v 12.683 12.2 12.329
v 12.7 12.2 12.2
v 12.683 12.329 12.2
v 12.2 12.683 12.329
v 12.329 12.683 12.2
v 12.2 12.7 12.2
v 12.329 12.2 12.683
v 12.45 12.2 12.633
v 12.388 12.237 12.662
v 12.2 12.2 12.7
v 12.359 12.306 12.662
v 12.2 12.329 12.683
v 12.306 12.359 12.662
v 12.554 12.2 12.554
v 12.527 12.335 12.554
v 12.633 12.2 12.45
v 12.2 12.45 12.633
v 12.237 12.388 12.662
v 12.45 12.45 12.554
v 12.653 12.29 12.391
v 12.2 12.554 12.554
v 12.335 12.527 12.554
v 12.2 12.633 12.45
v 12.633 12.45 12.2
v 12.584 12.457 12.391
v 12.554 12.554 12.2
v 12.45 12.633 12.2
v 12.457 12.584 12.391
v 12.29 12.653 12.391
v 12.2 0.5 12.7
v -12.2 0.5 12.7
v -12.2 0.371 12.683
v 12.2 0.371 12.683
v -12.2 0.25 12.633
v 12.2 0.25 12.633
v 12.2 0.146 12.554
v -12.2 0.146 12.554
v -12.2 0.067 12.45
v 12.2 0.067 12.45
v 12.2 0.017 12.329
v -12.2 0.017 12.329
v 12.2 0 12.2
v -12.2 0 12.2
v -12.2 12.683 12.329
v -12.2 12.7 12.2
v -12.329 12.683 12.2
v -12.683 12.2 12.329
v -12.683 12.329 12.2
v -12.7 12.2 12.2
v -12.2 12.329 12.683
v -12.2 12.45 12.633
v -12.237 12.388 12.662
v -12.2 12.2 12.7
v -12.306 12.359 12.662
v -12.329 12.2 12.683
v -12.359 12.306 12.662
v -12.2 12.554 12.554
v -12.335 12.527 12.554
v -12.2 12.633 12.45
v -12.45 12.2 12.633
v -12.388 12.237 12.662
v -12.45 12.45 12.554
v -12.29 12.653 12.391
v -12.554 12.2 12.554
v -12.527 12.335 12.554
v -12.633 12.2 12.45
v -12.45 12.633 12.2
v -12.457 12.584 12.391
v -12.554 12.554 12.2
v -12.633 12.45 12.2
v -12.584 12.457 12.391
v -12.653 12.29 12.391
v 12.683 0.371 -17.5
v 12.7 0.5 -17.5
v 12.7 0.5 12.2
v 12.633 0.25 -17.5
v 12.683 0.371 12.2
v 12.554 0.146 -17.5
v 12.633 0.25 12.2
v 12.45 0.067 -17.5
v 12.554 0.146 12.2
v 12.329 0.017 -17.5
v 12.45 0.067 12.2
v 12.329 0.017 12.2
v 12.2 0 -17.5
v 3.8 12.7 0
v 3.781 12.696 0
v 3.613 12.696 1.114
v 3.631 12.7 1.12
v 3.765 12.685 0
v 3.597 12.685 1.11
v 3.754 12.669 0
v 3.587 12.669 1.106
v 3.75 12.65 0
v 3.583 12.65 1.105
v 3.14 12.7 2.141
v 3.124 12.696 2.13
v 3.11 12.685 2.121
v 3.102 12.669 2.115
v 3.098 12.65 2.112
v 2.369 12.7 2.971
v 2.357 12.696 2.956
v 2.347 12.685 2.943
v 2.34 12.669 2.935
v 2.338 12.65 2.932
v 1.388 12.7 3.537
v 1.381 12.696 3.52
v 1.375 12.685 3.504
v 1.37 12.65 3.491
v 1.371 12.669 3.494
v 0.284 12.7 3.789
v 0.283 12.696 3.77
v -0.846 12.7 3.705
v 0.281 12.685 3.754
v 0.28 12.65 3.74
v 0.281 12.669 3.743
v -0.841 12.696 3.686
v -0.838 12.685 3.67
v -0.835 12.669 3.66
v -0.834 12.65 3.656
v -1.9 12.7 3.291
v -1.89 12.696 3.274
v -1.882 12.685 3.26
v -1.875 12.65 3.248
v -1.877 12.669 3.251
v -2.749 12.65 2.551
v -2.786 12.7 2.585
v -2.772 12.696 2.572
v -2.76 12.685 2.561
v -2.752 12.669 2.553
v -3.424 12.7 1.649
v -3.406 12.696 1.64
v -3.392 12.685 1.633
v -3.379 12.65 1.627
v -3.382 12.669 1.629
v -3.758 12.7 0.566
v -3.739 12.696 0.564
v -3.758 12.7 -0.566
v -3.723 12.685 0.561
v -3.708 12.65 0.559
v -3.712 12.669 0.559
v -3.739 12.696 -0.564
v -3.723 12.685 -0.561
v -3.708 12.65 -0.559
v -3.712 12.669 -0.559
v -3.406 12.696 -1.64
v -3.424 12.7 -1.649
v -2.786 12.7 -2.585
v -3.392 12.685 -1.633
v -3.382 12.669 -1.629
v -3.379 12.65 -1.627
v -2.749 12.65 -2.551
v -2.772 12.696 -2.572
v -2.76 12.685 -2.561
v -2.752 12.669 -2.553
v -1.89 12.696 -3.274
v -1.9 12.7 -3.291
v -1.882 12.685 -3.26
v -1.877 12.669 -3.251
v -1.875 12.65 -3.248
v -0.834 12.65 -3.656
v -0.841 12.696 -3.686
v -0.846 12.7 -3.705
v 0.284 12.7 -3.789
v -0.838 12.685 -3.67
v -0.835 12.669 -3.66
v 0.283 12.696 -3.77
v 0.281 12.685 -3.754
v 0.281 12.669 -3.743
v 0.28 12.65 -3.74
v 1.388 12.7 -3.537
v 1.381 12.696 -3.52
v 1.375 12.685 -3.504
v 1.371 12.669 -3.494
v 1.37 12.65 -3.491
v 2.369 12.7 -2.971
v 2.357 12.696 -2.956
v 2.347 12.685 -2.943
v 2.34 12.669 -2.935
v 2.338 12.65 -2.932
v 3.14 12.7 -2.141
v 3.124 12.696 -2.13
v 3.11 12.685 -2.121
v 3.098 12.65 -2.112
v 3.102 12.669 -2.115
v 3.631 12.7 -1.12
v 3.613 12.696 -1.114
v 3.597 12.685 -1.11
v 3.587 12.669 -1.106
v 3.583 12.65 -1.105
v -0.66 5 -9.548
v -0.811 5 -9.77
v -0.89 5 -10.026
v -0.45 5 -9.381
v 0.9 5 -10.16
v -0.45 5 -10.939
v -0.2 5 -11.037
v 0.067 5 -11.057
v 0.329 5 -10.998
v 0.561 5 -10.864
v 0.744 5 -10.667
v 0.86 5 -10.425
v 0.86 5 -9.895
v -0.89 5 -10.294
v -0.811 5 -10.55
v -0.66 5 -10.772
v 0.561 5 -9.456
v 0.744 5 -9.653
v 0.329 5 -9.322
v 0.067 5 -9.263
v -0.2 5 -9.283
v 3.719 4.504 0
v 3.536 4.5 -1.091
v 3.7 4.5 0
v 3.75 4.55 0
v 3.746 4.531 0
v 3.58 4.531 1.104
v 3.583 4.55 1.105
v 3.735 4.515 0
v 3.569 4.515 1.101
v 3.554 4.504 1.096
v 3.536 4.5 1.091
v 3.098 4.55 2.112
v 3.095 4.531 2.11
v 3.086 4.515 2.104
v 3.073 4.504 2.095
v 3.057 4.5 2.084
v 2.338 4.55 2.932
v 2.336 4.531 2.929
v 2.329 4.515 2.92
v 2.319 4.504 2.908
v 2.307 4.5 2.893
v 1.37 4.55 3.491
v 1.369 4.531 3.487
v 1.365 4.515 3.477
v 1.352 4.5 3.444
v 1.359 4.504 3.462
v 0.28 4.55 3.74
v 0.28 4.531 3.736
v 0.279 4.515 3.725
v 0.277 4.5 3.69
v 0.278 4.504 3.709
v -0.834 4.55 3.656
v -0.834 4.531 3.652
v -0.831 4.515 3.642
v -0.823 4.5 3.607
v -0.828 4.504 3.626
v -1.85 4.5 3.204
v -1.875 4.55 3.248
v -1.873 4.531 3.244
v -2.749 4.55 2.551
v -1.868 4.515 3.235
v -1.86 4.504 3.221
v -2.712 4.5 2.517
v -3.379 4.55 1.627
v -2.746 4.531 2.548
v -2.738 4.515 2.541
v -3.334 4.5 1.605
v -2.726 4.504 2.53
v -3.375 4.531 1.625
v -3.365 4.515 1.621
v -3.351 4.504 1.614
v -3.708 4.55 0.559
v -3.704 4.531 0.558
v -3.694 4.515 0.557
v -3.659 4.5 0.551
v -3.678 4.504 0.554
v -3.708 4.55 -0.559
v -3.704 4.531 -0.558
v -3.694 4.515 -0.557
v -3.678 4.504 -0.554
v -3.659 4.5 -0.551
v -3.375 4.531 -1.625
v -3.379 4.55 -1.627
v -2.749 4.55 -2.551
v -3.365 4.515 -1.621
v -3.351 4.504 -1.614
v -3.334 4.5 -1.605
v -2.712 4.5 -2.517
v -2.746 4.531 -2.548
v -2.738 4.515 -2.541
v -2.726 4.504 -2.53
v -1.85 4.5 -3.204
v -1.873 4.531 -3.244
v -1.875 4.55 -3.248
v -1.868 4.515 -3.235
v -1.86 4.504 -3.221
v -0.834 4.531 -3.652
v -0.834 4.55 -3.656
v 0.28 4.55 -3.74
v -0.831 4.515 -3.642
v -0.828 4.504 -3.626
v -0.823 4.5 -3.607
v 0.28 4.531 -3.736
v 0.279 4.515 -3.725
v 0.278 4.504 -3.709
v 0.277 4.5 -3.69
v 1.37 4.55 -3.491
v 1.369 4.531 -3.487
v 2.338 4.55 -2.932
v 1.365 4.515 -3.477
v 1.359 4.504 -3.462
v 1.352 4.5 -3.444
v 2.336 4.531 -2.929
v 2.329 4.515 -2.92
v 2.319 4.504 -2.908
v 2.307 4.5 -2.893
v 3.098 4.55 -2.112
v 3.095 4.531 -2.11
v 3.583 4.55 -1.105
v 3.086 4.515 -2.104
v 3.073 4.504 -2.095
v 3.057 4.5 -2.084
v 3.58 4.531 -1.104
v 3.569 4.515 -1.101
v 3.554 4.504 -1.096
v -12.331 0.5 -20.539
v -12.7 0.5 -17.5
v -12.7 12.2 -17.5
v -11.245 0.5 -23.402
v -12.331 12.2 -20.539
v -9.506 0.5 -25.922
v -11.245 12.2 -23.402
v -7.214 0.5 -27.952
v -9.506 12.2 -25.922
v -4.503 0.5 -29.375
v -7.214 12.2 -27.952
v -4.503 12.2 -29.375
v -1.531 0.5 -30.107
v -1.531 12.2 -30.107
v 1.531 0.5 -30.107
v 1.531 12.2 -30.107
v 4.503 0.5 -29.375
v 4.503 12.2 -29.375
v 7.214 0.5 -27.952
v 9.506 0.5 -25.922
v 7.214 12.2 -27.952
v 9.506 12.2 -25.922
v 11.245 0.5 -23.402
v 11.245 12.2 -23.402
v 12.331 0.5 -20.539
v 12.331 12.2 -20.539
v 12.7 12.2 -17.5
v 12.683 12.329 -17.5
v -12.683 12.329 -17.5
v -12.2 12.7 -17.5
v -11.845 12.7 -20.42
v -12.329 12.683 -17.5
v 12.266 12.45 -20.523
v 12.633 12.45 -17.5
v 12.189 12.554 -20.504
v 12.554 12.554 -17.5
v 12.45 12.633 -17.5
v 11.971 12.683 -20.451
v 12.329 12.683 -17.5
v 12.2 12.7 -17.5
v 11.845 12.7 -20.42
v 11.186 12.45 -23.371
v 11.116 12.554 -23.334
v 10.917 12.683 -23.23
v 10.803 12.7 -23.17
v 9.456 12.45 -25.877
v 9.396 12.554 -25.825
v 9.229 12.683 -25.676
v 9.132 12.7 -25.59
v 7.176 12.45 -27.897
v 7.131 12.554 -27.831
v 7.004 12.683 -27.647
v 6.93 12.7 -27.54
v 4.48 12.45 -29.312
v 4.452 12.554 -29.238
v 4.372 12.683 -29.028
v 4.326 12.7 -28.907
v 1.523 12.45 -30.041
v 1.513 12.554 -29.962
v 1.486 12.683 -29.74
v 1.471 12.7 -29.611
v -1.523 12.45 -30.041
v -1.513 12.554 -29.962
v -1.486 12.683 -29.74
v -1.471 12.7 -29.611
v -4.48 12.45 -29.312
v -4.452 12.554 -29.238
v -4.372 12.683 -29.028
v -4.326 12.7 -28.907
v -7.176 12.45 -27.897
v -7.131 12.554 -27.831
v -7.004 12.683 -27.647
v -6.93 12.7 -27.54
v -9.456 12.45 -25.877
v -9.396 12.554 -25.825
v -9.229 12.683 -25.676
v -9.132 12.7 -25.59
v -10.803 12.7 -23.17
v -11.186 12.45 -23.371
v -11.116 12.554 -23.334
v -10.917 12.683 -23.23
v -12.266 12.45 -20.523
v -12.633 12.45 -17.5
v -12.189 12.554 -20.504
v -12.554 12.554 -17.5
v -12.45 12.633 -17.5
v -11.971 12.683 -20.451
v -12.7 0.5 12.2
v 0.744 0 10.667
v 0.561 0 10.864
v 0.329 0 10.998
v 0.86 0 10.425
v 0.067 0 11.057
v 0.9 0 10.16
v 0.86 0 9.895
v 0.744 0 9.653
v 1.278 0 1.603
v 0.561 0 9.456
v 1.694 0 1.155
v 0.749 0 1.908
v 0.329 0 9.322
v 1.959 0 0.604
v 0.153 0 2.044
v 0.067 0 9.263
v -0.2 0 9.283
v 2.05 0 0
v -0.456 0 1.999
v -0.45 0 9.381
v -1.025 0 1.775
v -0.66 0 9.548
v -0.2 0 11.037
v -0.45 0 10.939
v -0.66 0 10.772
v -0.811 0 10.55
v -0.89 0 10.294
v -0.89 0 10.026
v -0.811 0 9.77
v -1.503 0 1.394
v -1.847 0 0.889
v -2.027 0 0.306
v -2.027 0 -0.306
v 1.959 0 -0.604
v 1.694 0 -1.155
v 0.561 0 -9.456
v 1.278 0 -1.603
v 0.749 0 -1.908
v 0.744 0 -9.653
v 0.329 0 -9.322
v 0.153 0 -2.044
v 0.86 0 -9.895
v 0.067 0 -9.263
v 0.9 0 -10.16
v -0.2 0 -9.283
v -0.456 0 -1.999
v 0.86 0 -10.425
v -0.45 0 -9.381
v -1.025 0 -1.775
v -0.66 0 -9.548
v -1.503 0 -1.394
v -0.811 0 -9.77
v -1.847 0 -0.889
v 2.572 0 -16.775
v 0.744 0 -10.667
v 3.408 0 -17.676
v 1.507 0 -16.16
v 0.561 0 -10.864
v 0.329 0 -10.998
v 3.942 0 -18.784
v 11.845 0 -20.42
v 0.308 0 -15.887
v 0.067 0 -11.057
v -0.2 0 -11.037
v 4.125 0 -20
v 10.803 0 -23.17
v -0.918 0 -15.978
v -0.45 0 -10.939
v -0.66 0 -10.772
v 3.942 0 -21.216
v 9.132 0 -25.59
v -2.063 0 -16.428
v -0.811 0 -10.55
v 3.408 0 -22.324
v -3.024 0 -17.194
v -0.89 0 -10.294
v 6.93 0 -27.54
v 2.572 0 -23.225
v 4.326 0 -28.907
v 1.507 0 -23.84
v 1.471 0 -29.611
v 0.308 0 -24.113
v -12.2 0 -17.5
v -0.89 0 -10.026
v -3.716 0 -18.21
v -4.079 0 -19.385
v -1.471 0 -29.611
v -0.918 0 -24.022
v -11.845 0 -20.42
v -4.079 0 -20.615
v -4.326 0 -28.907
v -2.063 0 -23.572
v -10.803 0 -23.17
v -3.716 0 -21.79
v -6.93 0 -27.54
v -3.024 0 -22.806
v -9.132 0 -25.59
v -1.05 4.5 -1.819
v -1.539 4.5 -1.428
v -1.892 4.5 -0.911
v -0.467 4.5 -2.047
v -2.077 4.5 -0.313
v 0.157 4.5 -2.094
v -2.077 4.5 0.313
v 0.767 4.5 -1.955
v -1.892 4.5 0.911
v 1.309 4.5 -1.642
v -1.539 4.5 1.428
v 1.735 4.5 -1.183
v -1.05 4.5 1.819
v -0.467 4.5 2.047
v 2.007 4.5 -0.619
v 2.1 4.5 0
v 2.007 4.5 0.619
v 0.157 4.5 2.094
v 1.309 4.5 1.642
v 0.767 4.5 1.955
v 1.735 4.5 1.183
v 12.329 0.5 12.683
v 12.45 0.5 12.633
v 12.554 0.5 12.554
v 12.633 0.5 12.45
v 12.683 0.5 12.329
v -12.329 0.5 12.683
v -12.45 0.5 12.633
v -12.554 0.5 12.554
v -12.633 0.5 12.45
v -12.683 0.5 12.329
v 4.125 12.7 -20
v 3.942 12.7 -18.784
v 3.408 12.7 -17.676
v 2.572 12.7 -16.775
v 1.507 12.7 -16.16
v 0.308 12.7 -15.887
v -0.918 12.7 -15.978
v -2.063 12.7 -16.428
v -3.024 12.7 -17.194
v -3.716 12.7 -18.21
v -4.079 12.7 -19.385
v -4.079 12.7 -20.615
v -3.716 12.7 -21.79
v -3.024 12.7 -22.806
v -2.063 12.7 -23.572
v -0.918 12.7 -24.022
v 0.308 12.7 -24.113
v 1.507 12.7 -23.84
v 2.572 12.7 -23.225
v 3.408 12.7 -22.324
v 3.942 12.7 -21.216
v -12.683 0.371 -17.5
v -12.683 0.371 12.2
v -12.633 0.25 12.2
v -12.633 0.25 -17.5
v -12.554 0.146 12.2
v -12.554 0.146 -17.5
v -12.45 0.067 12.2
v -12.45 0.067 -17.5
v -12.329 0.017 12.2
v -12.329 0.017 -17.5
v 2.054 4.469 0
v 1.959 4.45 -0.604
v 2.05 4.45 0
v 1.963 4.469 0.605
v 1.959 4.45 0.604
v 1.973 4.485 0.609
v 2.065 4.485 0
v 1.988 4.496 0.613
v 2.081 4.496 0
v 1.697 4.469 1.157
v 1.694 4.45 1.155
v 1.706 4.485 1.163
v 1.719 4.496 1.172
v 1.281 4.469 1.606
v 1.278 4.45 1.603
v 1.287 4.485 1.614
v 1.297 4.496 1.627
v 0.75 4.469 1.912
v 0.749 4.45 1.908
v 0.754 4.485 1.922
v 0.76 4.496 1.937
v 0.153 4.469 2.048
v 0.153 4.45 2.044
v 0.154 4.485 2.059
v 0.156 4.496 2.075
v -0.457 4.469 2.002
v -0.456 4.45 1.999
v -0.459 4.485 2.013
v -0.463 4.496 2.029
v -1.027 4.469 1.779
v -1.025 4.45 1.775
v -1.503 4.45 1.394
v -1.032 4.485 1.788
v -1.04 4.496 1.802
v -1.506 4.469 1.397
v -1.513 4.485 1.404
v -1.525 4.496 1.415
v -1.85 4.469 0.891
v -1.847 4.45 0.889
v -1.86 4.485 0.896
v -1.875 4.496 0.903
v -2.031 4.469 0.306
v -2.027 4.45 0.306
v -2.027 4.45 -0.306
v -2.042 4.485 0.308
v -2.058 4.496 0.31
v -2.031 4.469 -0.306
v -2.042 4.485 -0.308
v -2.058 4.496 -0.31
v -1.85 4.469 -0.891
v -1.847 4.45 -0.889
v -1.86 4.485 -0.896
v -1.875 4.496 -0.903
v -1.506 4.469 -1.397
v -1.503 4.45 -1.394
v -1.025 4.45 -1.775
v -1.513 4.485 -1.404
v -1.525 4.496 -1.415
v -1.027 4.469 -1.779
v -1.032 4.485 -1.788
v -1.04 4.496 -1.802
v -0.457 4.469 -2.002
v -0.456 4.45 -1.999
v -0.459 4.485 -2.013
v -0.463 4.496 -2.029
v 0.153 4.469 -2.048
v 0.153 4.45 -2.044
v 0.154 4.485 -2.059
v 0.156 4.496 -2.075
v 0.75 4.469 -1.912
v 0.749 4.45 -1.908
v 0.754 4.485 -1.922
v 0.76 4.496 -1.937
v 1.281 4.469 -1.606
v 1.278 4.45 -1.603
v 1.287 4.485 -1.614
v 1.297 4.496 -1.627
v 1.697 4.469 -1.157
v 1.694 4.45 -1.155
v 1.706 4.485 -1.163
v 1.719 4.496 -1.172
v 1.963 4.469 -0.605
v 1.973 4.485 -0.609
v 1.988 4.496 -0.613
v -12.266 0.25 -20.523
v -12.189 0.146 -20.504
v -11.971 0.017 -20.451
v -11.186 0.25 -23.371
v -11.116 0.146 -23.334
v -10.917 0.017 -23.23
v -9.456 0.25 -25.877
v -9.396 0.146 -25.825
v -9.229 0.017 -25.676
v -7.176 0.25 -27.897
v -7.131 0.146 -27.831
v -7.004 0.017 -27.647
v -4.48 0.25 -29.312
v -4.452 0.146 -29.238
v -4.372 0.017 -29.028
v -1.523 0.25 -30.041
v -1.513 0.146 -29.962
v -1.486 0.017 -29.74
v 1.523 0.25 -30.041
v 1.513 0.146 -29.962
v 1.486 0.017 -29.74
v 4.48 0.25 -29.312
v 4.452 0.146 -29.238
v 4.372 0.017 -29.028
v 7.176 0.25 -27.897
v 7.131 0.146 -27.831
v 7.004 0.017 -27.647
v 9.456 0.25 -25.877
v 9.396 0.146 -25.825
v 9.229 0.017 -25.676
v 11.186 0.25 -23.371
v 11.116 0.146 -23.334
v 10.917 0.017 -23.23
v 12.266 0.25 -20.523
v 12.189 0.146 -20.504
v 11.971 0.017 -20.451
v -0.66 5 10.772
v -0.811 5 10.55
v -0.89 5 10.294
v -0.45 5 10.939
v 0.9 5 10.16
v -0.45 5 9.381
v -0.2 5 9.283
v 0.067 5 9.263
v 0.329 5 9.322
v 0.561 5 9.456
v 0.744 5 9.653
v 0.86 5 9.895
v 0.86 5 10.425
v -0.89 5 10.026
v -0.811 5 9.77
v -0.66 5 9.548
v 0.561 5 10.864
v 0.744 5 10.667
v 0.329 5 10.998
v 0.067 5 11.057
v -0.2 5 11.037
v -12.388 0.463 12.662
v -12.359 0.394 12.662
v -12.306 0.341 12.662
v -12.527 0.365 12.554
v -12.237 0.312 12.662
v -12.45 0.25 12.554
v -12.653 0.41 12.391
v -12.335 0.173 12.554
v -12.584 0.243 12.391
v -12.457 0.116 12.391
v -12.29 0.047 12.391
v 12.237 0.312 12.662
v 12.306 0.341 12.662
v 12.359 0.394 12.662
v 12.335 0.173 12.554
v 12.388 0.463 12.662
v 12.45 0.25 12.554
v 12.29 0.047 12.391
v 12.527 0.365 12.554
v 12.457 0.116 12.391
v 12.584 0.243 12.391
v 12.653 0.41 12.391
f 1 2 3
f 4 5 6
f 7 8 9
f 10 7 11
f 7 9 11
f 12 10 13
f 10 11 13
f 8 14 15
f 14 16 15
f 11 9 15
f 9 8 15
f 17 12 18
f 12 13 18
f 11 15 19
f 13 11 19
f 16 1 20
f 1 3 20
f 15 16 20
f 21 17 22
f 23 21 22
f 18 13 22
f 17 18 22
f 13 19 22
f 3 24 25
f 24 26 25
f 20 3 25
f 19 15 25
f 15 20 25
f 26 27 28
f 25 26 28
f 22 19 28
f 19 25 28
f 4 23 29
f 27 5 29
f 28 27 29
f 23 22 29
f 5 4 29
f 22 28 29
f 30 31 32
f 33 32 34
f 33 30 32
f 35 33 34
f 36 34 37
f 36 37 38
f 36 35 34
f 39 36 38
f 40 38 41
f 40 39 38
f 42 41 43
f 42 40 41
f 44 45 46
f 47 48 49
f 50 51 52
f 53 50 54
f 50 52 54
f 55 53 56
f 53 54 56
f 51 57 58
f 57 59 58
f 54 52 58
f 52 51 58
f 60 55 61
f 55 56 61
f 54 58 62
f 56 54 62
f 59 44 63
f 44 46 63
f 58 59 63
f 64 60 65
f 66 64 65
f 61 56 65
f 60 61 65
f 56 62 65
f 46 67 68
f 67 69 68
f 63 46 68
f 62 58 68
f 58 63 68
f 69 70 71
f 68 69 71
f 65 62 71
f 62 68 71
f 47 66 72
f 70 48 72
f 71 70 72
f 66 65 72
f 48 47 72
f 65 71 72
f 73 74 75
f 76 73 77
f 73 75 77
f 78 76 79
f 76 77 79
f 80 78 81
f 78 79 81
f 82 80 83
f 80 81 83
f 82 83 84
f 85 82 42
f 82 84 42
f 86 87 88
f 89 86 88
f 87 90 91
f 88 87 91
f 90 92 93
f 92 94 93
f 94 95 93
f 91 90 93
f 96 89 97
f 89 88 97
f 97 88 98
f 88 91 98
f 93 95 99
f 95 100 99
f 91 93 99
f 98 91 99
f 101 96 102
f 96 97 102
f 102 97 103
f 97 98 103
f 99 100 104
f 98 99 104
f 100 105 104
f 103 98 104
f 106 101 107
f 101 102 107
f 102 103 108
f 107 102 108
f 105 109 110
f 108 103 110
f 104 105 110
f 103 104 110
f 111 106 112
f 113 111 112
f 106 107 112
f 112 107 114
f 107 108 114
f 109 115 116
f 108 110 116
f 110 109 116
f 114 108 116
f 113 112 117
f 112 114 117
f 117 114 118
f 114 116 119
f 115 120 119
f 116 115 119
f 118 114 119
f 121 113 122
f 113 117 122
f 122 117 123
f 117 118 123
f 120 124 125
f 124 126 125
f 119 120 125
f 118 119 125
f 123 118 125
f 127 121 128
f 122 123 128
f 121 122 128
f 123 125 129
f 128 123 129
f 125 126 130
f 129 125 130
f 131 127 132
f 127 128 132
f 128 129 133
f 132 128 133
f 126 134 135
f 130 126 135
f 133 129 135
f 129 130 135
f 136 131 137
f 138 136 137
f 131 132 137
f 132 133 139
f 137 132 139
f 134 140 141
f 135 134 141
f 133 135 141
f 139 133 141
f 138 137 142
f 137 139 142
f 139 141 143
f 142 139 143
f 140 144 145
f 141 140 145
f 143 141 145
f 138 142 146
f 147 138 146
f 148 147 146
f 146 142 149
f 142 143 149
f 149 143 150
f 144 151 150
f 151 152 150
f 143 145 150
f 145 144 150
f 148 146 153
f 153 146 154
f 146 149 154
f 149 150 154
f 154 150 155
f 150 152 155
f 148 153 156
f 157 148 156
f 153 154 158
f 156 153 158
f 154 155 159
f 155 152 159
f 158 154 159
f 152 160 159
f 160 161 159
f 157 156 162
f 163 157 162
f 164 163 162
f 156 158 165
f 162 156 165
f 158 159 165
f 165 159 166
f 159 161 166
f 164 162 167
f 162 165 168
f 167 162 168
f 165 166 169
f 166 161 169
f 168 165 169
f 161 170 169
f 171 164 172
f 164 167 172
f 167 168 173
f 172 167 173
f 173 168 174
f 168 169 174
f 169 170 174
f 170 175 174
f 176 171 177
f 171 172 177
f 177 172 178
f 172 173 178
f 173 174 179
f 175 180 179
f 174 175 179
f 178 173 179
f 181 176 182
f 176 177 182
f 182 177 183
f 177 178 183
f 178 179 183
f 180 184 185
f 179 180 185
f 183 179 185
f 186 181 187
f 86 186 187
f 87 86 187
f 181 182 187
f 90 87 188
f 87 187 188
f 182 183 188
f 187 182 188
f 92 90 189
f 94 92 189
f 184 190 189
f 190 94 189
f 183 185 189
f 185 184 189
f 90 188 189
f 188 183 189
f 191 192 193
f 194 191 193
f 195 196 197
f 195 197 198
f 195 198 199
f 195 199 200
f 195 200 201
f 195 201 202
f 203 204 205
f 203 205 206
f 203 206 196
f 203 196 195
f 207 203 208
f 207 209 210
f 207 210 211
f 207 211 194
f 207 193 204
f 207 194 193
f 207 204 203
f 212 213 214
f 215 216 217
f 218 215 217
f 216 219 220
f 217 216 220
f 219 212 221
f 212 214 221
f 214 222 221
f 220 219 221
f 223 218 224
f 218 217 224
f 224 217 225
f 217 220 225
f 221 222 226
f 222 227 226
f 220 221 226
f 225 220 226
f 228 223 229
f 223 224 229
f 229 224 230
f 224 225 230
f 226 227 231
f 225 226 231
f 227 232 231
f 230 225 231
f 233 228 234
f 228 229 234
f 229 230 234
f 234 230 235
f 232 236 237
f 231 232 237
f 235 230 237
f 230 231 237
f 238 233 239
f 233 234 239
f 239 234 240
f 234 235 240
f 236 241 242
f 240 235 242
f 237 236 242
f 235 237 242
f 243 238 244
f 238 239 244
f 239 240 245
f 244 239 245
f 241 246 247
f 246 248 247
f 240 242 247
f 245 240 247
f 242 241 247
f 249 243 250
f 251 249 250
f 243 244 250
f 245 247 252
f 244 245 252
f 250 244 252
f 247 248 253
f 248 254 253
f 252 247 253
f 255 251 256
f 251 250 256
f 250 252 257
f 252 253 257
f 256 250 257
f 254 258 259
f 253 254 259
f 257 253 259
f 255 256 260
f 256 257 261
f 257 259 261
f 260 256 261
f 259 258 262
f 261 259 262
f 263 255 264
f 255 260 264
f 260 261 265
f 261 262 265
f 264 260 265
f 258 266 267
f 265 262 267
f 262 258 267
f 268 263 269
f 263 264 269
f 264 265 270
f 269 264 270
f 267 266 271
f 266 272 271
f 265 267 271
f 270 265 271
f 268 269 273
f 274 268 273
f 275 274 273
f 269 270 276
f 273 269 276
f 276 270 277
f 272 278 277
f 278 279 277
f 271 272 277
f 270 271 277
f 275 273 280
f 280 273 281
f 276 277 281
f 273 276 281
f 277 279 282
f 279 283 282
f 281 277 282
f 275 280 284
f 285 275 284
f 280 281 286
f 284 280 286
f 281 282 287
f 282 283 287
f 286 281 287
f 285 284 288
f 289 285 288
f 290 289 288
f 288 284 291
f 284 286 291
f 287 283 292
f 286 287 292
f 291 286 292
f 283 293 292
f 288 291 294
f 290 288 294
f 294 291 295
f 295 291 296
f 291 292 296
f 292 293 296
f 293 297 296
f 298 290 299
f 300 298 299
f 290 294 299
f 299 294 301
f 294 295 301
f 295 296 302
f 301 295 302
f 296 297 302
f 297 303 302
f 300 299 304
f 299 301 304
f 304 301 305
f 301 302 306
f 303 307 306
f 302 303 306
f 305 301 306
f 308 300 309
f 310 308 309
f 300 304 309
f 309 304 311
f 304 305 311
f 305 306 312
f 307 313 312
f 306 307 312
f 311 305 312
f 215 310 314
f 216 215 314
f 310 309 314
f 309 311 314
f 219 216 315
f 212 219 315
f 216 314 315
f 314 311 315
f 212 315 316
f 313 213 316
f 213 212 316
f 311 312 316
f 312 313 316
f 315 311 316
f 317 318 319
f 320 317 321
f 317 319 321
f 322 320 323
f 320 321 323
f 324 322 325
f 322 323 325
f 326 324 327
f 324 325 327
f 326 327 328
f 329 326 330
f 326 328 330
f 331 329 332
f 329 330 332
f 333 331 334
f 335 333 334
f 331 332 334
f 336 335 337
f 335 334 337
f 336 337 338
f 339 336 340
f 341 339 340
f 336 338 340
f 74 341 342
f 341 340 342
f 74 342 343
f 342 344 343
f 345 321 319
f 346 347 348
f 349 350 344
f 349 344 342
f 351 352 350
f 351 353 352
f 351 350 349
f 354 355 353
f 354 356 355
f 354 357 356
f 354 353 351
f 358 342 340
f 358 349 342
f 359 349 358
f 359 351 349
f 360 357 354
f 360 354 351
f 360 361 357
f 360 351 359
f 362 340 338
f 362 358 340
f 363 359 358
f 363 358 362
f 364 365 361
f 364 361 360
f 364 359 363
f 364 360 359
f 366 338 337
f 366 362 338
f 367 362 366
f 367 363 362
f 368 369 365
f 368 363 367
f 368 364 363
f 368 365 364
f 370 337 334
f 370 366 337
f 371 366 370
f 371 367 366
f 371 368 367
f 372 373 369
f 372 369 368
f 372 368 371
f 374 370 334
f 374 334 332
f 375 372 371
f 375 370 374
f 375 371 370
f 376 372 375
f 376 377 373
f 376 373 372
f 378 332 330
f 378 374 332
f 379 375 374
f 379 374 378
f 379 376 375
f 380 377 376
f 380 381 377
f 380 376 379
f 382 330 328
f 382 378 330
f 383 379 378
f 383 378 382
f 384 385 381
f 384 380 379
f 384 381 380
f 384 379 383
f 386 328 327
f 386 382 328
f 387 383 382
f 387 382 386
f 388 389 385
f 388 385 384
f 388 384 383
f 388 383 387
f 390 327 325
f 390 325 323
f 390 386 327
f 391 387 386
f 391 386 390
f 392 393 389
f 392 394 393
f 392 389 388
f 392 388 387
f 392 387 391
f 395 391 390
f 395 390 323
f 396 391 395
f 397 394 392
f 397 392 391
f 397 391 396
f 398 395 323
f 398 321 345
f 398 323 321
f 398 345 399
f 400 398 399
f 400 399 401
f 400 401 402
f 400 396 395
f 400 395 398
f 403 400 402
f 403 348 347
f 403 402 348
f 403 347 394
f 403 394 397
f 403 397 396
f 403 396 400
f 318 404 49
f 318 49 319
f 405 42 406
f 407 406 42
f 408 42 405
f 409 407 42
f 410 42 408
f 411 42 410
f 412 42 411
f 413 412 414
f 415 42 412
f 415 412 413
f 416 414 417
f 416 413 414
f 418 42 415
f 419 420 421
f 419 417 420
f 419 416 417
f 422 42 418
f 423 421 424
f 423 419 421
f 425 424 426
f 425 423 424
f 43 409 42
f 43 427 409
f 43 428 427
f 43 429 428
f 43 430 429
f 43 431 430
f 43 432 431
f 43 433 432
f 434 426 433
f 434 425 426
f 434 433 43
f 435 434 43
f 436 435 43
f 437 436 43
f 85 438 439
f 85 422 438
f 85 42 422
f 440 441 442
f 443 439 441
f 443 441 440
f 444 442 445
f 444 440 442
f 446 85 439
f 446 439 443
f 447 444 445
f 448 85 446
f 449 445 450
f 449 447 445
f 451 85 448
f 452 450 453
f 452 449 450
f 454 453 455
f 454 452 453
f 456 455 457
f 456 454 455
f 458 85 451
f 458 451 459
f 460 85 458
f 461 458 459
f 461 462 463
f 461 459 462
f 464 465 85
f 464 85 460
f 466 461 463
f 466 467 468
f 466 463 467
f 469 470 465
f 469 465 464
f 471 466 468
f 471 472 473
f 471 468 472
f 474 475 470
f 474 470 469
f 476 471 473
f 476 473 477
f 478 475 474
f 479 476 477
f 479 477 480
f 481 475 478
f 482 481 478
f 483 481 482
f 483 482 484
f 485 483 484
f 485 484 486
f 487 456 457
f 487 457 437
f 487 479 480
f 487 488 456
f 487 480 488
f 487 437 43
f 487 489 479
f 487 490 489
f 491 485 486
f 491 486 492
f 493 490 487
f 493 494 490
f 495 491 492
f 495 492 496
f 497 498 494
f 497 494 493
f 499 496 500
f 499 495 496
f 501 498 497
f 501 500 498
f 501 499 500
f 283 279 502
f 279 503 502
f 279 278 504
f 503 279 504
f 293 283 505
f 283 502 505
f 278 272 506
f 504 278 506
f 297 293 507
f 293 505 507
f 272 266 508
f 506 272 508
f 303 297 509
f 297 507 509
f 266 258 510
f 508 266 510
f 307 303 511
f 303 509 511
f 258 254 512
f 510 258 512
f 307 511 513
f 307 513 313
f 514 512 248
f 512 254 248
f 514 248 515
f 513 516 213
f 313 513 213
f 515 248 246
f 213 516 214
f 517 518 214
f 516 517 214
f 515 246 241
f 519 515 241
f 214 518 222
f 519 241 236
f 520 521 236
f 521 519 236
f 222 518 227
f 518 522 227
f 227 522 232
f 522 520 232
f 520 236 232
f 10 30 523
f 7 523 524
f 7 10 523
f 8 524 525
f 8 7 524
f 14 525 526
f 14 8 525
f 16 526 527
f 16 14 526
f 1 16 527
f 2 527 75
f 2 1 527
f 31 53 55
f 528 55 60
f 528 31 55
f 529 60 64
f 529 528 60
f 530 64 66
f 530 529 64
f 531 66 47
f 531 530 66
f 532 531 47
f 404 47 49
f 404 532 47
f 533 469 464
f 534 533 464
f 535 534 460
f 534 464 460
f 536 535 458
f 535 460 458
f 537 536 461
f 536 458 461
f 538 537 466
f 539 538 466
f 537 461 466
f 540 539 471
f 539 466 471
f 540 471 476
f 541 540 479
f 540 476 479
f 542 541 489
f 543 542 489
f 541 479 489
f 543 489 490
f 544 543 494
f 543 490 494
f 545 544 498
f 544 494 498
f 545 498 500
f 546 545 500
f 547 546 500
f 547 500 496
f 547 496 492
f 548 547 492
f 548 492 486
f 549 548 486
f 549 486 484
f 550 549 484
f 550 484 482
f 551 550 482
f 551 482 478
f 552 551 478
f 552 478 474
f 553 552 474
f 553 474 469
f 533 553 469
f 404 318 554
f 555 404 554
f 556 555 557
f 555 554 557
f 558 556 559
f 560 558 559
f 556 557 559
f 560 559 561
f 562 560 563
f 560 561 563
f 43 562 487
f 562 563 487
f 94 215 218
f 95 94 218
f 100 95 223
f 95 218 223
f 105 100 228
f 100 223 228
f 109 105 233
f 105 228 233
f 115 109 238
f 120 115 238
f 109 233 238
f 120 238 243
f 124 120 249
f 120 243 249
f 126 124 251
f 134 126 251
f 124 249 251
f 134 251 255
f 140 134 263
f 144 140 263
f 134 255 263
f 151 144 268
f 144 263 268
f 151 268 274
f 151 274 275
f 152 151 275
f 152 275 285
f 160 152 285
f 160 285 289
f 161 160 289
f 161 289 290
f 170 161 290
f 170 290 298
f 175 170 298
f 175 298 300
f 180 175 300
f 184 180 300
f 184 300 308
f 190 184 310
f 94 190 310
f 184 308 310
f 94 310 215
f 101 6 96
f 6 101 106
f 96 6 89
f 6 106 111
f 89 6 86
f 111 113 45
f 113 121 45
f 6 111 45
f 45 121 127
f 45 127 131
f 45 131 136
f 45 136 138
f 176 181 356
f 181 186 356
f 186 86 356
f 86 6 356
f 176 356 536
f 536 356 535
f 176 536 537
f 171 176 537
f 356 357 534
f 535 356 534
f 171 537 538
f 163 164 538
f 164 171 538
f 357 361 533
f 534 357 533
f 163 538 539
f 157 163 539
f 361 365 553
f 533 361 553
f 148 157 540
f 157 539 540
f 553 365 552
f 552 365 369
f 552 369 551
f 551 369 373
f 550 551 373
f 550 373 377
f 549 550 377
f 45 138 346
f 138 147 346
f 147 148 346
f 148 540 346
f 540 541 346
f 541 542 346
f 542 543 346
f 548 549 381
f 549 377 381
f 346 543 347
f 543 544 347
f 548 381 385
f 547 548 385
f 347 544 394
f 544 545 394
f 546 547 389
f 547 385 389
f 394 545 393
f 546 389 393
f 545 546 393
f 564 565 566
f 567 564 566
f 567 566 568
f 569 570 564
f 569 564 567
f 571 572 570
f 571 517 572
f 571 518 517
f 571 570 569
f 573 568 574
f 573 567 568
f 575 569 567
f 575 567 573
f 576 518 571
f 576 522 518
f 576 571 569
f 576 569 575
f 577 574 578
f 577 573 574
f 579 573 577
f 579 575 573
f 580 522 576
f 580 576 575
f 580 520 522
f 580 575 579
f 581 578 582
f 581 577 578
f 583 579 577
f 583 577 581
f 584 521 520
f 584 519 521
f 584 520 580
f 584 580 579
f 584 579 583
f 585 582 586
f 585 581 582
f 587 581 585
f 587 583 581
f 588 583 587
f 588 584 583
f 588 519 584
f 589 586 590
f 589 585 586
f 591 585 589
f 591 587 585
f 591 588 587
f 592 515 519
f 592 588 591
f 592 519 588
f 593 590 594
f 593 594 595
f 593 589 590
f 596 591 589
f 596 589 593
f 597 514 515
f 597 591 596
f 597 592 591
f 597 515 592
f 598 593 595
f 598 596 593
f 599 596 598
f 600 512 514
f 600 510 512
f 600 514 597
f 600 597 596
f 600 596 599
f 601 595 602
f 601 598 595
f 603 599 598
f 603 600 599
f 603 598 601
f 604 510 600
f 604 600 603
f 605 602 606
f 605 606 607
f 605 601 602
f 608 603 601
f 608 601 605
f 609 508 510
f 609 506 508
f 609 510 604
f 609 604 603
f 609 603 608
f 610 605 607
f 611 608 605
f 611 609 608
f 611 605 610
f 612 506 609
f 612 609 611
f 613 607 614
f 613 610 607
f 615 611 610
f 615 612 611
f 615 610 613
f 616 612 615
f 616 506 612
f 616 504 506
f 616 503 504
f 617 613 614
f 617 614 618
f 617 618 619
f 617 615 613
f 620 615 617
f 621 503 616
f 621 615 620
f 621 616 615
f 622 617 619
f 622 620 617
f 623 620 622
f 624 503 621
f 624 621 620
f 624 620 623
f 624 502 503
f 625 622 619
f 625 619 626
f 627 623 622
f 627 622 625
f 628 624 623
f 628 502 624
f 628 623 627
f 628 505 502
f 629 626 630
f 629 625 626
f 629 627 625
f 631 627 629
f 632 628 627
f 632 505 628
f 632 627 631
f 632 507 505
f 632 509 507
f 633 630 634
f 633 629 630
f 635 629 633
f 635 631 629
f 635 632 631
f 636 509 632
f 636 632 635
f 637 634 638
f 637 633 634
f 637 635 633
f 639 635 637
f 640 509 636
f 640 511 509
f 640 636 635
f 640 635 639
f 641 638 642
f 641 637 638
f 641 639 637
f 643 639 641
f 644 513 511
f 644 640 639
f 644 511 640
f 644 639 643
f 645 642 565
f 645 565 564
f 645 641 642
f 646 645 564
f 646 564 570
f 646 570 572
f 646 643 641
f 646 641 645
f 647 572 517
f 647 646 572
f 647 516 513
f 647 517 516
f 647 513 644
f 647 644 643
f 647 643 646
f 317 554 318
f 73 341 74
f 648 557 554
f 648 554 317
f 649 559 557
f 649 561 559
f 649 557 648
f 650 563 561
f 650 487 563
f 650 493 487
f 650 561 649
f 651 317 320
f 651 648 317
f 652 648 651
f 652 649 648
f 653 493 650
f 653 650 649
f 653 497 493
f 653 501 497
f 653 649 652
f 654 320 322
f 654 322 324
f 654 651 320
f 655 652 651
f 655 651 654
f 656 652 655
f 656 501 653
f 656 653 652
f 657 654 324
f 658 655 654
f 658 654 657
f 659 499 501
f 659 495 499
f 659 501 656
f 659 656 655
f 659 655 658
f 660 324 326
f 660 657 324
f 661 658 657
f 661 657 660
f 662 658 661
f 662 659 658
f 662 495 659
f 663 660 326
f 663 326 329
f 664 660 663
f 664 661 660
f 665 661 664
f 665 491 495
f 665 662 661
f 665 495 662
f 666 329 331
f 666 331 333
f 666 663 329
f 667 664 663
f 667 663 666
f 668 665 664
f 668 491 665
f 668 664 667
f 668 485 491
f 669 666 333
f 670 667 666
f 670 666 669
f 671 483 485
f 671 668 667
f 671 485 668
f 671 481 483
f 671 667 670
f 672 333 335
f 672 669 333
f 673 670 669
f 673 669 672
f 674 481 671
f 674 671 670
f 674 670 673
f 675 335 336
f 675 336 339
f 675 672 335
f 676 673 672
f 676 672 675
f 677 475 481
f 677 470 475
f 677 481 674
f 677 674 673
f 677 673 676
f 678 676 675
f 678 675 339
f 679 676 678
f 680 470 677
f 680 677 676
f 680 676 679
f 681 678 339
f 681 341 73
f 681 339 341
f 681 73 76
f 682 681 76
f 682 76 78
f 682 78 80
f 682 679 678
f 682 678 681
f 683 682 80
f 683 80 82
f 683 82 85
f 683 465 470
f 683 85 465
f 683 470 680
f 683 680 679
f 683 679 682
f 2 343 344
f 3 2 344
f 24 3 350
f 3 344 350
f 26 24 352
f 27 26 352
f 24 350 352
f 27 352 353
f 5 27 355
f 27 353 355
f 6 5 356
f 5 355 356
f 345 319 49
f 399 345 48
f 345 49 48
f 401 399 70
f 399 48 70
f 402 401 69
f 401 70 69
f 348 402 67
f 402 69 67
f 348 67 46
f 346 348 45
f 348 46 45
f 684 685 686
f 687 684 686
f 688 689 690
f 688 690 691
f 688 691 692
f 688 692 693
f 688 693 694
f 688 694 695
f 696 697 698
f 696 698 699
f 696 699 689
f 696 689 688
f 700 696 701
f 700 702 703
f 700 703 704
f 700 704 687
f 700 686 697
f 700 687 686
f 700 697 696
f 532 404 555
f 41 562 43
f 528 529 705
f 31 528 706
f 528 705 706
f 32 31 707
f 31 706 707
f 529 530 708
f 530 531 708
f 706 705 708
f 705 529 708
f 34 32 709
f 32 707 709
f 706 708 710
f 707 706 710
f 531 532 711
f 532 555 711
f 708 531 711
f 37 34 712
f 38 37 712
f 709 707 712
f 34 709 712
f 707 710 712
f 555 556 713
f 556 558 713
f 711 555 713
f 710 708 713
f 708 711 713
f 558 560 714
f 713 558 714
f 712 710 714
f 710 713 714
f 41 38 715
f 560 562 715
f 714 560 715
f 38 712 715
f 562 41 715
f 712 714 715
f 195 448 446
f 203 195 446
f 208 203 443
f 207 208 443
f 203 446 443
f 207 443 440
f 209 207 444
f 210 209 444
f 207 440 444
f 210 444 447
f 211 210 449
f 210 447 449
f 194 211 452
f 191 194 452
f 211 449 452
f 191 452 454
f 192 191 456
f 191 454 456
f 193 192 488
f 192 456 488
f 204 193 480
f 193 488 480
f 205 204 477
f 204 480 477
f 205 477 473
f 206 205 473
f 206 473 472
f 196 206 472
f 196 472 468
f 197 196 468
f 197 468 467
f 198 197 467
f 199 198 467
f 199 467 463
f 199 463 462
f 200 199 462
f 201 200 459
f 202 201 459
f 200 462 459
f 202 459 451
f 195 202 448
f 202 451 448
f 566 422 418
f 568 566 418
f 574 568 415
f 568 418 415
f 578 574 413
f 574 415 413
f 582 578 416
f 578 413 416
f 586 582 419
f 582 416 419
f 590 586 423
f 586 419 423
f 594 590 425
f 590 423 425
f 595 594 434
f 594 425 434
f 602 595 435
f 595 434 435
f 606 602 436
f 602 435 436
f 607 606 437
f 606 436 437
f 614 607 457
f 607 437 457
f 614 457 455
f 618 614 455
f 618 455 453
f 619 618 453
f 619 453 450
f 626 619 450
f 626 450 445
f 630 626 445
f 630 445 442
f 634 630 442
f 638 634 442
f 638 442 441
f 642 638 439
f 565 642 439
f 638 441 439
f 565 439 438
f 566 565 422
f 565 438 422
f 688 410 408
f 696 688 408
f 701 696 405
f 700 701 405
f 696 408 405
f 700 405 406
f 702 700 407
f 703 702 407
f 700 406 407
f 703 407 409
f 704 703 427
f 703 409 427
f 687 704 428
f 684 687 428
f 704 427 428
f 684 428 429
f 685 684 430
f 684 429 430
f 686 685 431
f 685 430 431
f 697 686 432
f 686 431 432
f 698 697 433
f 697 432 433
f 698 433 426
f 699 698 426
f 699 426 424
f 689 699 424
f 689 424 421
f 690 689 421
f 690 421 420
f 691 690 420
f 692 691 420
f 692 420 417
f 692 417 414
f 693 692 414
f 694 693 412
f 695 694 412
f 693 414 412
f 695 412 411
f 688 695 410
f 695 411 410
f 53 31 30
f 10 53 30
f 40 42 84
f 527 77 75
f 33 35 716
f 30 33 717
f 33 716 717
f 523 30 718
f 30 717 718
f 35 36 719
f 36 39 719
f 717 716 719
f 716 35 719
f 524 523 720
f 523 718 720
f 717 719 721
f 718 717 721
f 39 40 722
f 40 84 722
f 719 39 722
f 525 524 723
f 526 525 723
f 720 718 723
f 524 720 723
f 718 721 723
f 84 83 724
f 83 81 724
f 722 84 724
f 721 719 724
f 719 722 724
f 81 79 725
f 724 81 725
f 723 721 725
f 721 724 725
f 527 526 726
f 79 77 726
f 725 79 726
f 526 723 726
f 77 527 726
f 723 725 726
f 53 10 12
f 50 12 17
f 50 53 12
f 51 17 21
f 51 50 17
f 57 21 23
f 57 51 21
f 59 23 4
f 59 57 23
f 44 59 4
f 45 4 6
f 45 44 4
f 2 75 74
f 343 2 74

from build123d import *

# Parameters (mm, degrees)
SKETCH1_W               = 25.4
SKETCH1_H               = 35
BOSS_EXTRUDE1_DEPTH     = 12.7
FILLET1_R               = 0.05
SKETCH4_R               = 0.775
BOSS_EXTRUDE2_DEPTH     = 2
FILLET2_R               = 0.1
BOSS_EXTRUDE3_DEPTH     = 12.7
FILLET3_R               = 0.5
SKETCH12_W              = 28.953239704
SKETCH12_H              = 4.8
CUT_EXTRUDE6_DEPTH      = 13.7
CUT_EXTRUDE6_DEPTH_BACK = 3
SKETCH10_R              = 4.125
CUT_EXTRUDE1_DEPTH      = 3
CUT_EXTRUDE1_DEPTH_BACK = 13.7
SKETCH11_R              = 0.9
CUT_EXTRUDE3_DEPTH      = 3
CUT_EXTRUDE3_DEPTH_BACK = 5
FILLET4_R               = 0.5


with BuildPart() as part:
    # Sketch1 → Boss-Extrude1 (new body)
    with BuildSketch(Plane(origin=(0, 0, 0), x_dir=(1, 0, 0), z_dir=(0, 1, 0))):
        Rectangle(SKETCH1_W, SKETCH1_H)
    extrude(amount=BOSS_EXTRUDE1_DEPTH)

    # Sketch2 → Cut-Revolve1 (revolve, cut)
    with BuildSketch(Plane.XY):
        Polygon((3.75, 12.7), (3.75, 4.5), (2.05, 4.5), (2.05, 0), (0, 0), (0, 12.7), align=None)
    revolve(axis=Axis((0, 7.839551451, 0), (0, -1, 0)), mode=Mode.SUBTRACT)

    # Fillet1
    fillet1_edges = [part.edges().sort_by_distance(p)[0] for p in [
        (-3.75, 12.7, 0),
        (-3.75, 4.5, 0),
        (-2.05, 4.5, 0),
    ]]
    fillet(fillet1_edges, radius=FILLET1_R)

    # Sketch4 → Boss-Extrude2 (add)
    with BuildSketch(Plane.XZ):
        with Locations((0, 10.16)):
            Circle(SKETCH4_R)
        with Locations((0, -10.16)):
            Circle(SKETCH4_R)
    extrude(amount=BOSS_EXTRUDE2_DEPTH)

    # Fillet2
    fillet2_edges = [part.edges().sort_by_distance(p)[0] for p in [
        (-0.775, -2, 10.16),
        (-0.775, -2, -10.16),
    ]]
    fillet(fillet2_edges, radius=FILLET2_R)

    # Sketch9 → Boss-Extrude3 (add)
    with BuildSketch(Plane(origin=(0, 12.7, 0), x_dir=(1, 0, 0), z_dir=(0, 1, 0))):
        with BuildLine():
            Line((12.7, 17.5), (-12.7, 17.5))
            ThreePointArc((-12.7, 17.5), (0, 30.2), (12.7, 17.5))
        make_face()
    extrude(amount=-BOSS_EXTRUDE3_DEPTH)

    # Fillet3
    fillet3_edges = [part.edges().sort_by_distance(p)[0] for p in [
        (12.7, 12.7, 0),
        (-12.7, 12.7, 0),
        (0, 12.7, -30.2),
        (0, 0, -30.2),
        (12.7, 0, 0),
        (0, 0, 17.5),
        (-12.7, 0, 0),
    ]]
    fillet(fillet3_edges, radius=FILLET3_R)

    # Sketch12 → Cut-Extrude6 (cut, two sides)
    with BuildSketch(Plane(origin=(0, 0, 0), x_dir=(1, 0, 0), z_dir=(0, 1, 0))) as cut_extrude6_sk:
        with Locations((1.024131642, -15.1)):
            Rectangle(SKETCH12_W, SKETCH12_H)
    extrude(amount=CUT_EXTRUDE6_DEPTH, mode=Mode.SUBTRACT)
    extrude(cut_extrude6_sk.sketch, amount=-CUT_EXTRUDE6_DEPTH_BACK, mode=Mode.SUBTRACT)

    # Sketch10 → Cut-Extrude1 (cut, two sides)
    with BuildSketch(Plane.XZ) as cut_extrude1_sk:
        with Locations((0, -20)):
            Circle(SKETCH10_R)
    extrude(amount=CUT_EXTRUDE1_DEPTH, mode=Mode.SUBTRACT)
    extrude(cut_extrude1_sk.sketch, amount=-CUT_EXTRUDE1_DEPTH_BACK, mode=Mode.SUBTRACT)

    # Sketch11 → Cut-Extrude3 (cut, two sides)
    with BuildSketch(Plane.XZ) as cut_extrude3_sk:
        with Locations((0, -10.16)):
            Circle(SKETCH11_R)
        with Locations((0, 10.16)):
            Circle(SKETCH11_R)
    extrude(amount=CUT_EXTRUDE3_DEPTH, mode=Mode.SUBTRACT)
    extrude(cut_extrude3_sk.sketch, amount=-CUT_EXTRUDE3_DEPTH_BACK, mode=Mode.SUBTRACT)

    # Fillet4
    fillet4_edges = [part.edges().sort_by_distance(p)[0] for p in [
        (12.553553391, 0.146446609, 12.7),
        (-12.553553391, 12.553553391, 12.7),
        (-12.553553391, 0.146446609, 12.7),
        (12.553553391, 12.553553391, 12.7),
        (12.7, 6.35, 12.7),
        (0, 0, 12.7),
        (-12.7, 6.35, 12.7),
        (0, 12.7, 12.7),
    ]]
    fillet(fillet4_edges, radius=FILLET4_R)


solid = part.part
